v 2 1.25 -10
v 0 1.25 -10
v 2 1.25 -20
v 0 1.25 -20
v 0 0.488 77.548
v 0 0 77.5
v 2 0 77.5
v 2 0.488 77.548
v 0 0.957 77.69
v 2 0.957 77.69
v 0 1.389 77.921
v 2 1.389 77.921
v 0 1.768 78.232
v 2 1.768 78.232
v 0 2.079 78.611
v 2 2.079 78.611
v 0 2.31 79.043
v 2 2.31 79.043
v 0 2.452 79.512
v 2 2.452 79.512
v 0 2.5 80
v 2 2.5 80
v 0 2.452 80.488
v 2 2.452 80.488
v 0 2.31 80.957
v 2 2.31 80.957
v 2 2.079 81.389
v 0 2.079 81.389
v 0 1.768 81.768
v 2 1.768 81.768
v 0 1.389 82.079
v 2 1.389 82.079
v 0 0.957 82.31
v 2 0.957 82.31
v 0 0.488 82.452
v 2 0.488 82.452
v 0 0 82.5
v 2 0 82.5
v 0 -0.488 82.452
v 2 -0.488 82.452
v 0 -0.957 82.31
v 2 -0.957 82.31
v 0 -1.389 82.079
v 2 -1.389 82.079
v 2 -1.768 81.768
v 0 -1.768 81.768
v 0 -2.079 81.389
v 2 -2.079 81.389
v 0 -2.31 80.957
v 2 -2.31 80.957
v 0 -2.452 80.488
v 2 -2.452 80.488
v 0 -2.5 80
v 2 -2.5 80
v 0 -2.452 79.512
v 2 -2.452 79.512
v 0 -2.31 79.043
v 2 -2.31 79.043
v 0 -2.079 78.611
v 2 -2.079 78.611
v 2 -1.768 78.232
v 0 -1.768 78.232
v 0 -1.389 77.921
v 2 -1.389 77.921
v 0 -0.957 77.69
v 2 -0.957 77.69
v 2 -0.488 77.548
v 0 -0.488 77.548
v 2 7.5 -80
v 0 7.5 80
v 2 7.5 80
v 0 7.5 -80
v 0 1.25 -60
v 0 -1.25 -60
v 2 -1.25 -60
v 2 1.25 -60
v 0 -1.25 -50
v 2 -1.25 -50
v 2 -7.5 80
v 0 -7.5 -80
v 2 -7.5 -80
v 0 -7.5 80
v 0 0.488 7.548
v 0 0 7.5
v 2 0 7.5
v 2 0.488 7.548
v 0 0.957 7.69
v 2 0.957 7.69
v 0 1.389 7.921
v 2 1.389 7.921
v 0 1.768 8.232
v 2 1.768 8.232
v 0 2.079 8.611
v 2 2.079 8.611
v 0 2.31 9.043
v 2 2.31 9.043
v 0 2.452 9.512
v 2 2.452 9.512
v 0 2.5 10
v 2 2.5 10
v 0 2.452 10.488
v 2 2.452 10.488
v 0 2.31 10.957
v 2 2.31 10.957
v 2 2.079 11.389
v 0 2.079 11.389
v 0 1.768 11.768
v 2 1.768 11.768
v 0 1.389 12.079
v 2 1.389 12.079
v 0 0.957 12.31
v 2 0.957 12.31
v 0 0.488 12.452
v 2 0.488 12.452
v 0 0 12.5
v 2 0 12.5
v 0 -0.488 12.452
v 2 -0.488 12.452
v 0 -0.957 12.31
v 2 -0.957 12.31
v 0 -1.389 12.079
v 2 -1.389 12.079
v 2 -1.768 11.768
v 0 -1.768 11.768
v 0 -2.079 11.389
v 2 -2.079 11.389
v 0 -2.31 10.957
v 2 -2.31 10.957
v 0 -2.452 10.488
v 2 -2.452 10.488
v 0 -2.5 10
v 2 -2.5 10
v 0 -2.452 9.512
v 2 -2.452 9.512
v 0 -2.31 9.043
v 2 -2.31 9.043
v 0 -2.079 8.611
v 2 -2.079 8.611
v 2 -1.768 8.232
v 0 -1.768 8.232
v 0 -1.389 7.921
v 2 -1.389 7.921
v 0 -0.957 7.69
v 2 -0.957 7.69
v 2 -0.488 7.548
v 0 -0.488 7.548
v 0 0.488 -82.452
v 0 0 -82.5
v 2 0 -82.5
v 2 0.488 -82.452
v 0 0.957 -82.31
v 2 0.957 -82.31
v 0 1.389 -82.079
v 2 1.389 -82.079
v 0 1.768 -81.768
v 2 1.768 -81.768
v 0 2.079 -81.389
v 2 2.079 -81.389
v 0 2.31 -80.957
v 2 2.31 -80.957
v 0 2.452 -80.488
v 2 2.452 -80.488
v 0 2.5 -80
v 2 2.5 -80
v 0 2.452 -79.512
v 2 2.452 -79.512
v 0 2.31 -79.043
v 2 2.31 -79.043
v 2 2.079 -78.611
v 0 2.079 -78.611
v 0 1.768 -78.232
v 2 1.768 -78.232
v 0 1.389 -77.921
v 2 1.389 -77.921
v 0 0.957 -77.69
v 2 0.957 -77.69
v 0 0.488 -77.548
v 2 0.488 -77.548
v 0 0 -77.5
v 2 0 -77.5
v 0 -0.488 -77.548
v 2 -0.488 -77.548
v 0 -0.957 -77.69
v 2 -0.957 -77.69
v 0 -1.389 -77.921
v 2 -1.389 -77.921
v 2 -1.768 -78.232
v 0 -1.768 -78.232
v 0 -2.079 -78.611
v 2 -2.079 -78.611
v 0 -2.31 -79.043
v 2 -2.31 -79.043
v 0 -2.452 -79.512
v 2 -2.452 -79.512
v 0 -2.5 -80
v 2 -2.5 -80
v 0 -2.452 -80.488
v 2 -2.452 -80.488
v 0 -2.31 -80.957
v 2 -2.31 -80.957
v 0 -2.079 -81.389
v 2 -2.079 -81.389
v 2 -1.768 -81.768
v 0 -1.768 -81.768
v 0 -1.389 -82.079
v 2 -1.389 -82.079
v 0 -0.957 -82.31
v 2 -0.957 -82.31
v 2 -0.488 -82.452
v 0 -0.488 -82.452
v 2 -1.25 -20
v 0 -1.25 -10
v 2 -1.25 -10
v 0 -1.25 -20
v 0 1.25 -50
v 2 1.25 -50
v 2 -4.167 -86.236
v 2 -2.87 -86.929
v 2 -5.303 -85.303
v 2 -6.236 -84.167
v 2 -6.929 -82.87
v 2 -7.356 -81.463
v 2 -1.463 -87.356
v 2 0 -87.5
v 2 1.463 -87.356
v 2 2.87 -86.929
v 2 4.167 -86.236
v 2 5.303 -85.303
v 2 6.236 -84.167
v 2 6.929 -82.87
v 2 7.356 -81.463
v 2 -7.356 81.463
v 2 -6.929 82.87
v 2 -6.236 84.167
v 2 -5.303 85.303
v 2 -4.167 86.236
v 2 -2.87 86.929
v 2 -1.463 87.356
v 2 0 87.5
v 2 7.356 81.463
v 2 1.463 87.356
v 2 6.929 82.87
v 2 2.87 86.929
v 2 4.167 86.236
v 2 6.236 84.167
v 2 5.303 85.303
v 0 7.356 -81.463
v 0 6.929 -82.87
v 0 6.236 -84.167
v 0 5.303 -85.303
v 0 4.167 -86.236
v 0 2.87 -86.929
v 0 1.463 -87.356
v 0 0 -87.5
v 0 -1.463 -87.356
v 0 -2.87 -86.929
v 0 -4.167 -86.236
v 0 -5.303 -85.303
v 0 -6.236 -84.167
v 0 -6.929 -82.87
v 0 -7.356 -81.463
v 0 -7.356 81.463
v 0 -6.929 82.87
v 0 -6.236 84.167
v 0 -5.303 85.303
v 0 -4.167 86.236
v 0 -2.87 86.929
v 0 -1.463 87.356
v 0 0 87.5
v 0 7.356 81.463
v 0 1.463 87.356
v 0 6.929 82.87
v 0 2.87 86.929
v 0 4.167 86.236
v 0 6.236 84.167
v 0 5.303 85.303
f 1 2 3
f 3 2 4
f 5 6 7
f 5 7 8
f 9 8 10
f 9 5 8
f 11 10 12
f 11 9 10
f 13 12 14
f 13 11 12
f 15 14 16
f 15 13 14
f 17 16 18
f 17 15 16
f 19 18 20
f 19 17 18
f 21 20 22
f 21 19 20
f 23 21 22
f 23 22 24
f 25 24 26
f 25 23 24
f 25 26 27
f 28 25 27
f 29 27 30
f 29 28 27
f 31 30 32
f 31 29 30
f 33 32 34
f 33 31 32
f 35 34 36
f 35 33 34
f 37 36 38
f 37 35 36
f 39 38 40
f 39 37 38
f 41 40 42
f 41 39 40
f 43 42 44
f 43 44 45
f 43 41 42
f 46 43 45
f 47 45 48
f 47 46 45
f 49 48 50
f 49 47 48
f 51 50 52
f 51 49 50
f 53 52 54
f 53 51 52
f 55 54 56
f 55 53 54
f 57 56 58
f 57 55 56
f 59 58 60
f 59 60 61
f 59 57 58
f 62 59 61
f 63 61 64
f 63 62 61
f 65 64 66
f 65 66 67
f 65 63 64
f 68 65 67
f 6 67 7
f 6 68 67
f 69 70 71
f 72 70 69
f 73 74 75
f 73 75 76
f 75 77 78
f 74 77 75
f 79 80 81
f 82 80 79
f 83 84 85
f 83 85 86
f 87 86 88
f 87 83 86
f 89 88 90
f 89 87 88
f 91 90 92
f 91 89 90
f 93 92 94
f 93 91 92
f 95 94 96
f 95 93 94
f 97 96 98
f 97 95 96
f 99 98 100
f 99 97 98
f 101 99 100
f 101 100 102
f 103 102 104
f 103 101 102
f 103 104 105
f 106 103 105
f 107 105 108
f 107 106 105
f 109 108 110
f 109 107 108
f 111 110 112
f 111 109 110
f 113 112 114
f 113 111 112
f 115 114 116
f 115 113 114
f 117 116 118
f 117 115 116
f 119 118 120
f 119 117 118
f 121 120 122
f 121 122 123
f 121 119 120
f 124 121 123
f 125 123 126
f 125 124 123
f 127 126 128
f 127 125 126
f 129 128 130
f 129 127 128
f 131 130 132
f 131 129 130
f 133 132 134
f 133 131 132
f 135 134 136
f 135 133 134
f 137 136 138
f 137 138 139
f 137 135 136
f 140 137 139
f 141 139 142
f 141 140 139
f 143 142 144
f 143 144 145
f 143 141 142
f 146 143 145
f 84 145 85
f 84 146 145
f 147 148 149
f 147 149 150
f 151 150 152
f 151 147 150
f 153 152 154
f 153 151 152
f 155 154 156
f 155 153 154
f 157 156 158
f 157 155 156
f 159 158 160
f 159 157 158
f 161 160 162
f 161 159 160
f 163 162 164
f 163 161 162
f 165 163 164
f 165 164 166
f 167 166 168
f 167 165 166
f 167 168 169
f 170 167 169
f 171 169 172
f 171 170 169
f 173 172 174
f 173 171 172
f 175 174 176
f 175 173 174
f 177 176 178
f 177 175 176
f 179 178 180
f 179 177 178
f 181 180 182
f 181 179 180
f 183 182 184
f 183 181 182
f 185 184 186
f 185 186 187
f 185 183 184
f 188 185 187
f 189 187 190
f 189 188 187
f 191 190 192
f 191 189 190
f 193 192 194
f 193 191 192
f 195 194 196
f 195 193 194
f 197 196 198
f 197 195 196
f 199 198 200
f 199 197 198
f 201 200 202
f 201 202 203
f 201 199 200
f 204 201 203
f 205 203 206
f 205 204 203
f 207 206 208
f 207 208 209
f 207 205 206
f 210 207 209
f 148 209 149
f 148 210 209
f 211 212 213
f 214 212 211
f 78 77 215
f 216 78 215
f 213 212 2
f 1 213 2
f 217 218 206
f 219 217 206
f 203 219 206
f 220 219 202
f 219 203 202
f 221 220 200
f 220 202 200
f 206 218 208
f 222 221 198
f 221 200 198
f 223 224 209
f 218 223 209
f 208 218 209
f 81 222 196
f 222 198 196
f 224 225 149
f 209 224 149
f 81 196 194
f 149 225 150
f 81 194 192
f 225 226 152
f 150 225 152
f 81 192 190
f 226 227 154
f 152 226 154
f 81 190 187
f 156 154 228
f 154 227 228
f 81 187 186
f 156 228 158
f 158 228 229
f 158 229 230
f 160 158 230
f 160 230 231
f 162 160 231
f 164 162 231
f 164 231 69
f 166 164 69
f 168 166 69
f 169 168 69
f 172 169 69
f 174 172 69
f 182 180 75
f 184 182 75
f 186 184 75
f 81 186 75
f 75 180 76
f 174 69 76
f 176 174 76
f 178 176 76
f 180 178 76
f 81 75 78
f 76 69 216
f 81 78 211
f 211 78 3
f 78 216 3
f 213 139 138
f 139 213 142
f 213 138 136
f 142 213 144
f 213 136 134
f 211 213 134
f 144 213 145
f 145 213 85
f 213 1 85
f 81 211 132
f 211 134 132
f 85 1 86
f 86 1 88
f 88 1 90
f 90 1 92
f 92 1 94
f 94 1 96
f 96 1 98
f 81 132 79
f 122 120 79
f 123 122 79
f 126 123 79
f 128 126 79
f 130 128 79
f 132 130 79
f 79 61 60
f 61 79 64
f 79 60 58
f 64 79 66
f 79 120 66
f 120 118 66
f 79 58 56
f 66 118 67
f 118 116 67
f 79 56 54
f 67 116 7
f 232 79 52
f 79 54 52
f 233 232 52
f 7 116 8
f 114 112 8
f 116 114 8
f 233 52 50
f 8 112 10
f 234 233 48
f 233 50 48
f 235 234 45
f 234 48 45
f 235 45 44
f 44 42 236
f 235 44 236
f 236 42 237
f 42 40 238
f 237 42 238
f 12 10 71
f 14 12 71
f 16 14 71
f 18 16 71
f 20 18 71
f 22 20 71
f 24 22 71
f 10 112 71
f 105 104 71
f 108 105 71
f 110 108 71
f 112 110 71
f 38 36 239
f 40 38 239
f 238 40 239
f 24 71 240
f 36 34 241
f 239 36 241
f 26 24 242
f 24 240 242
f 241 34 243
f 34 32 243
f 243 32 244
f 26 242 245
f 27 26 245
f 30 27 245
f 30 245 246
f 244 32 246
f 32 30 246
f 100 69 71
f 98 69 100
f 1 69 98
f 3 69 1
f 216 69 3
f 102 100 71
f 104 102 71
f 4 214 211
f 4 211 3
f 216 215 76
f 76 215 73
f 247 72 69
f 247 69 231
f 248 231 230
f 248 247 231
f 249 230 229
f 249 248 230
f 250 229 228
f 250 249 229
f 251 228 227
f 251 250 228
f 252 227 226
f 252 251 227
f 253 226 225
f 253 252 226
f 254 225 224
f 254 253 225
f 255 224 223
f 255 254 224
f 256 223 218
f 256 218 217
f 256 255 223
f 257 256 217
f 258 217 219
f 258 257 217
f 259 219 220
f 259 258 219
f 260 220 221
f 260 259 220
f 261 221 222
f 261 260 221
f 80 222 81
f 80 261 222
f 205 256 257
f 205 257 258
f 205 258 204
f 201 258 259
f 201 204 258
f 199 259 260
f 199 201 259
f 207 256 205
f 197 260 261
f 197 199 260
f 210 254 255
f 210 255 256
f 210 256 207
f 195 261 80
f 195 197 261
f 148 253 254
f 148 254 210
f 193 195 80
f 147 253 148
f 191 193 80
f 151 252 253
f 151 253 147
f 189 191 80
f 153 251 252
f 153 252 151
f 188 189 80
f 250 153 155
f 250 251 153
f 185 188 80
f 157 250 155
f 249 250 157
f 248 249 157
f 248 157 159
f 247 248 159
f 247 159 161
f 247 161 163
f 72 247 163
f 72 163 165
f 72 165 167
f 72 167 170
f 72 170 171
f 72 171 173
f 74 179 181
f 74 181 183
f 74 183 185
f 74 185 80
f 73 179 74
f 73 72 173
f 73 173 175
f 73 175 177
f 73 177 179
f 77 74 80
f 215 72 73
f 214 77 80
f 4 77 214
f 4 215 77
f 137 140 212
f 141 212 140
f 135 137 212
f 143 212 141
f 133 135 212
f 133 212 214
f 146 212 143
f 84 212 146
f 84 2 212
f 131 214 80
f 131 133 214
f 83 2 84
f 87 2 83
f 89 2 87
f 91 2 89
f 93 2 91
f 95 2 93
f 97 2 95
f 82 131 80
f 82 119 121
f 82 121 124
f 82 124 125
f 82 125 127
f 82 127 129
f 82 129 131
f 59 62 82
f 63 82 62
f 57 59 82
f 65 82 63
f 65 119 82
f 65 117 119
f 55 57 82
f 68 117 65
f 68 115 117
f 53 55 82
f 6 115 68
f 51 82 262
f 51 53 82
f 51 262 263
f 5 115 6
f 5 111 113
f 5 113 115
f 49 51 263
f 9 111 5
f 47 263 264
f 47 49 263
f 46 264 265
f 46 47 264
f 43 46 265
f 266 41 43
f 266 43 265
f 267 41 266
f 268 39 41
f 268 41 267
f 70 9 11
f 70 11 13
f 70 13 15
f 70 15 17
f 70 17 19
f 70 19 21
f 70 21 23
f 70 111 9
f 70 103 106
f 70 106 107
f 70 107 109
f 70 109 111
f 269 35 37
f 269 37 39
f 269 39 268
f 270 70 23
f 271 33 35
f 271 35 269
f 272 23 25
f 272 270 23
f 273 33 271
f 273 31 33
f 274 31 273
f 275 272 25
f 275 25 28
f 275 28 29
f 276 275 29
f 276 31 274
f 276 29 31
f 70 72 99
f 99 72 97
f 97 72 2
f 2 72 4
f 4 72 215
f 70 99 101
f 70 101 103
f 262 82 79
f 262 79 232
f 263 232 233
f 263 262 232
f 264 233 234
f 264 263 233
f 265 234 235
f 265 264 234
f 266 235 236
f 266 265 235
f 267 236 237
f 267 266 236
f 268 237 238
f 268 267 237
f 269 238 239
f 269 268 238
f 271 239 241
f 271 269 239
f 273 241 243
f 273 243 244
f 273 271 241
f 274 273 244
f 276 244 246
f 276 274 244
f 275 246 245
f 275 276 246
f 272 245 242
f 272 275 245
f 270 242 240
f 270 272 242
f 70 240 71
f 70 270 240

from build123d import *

# Parameters (mm, degrees)
SCHIZZO1_R                   = 2.5
SCHIZZO1_W                   = 10
SCHIZZO1_H                   = 2.5
ESTRUSIONE_ESTRUSIONE1_DEPTH = 2


with BuildPart() as part:
    # Schizzo1 → Estrusione-Estrusione1 (new body)
    with BuildSketch(Plane(origin=(0, 0, 0), x_dir=(0, 0, -1), z_dir=(1, 0, 0))):
        with BuildLine():
            Line((80, -7.5), (-80, -7.5))
            ThreePointArc((-80, -7.5), (-87.5, 0), (-80, 7.5))
            Line((-80, 7.5), (80, 7.5))
            ThreePointArc((80, 7.5), (87.5, 0), (80, -7.5))
        make_face()
        with Locations((-80, 0)):
            Circle(SCHIZZO1_R, mode=Mode.SUBTRACT)
        with Locations((80, 0)):
            Circle(SCHIZZO1_R, mode=Mode.SUBTRACT)
        with Locations((-10, 0)):
            Circle(SCHIZZO1_R, mode=Mode.SUBTRACT)
        with Locations((15, 0)):
            Rectangle(SCHIZZO1_W, SCHIZZO1_H, mode=Mode.SUBTRACT)
        with Locations((55, 0)):
            Rectangle(SCHIZZO1_W, SCHIZZO1_H, mode=Mode.SUBTRACT)
    extrude(amount=ESTRUSIONE_ESTRUSIONE1_DEPTH)


solid = part.part
